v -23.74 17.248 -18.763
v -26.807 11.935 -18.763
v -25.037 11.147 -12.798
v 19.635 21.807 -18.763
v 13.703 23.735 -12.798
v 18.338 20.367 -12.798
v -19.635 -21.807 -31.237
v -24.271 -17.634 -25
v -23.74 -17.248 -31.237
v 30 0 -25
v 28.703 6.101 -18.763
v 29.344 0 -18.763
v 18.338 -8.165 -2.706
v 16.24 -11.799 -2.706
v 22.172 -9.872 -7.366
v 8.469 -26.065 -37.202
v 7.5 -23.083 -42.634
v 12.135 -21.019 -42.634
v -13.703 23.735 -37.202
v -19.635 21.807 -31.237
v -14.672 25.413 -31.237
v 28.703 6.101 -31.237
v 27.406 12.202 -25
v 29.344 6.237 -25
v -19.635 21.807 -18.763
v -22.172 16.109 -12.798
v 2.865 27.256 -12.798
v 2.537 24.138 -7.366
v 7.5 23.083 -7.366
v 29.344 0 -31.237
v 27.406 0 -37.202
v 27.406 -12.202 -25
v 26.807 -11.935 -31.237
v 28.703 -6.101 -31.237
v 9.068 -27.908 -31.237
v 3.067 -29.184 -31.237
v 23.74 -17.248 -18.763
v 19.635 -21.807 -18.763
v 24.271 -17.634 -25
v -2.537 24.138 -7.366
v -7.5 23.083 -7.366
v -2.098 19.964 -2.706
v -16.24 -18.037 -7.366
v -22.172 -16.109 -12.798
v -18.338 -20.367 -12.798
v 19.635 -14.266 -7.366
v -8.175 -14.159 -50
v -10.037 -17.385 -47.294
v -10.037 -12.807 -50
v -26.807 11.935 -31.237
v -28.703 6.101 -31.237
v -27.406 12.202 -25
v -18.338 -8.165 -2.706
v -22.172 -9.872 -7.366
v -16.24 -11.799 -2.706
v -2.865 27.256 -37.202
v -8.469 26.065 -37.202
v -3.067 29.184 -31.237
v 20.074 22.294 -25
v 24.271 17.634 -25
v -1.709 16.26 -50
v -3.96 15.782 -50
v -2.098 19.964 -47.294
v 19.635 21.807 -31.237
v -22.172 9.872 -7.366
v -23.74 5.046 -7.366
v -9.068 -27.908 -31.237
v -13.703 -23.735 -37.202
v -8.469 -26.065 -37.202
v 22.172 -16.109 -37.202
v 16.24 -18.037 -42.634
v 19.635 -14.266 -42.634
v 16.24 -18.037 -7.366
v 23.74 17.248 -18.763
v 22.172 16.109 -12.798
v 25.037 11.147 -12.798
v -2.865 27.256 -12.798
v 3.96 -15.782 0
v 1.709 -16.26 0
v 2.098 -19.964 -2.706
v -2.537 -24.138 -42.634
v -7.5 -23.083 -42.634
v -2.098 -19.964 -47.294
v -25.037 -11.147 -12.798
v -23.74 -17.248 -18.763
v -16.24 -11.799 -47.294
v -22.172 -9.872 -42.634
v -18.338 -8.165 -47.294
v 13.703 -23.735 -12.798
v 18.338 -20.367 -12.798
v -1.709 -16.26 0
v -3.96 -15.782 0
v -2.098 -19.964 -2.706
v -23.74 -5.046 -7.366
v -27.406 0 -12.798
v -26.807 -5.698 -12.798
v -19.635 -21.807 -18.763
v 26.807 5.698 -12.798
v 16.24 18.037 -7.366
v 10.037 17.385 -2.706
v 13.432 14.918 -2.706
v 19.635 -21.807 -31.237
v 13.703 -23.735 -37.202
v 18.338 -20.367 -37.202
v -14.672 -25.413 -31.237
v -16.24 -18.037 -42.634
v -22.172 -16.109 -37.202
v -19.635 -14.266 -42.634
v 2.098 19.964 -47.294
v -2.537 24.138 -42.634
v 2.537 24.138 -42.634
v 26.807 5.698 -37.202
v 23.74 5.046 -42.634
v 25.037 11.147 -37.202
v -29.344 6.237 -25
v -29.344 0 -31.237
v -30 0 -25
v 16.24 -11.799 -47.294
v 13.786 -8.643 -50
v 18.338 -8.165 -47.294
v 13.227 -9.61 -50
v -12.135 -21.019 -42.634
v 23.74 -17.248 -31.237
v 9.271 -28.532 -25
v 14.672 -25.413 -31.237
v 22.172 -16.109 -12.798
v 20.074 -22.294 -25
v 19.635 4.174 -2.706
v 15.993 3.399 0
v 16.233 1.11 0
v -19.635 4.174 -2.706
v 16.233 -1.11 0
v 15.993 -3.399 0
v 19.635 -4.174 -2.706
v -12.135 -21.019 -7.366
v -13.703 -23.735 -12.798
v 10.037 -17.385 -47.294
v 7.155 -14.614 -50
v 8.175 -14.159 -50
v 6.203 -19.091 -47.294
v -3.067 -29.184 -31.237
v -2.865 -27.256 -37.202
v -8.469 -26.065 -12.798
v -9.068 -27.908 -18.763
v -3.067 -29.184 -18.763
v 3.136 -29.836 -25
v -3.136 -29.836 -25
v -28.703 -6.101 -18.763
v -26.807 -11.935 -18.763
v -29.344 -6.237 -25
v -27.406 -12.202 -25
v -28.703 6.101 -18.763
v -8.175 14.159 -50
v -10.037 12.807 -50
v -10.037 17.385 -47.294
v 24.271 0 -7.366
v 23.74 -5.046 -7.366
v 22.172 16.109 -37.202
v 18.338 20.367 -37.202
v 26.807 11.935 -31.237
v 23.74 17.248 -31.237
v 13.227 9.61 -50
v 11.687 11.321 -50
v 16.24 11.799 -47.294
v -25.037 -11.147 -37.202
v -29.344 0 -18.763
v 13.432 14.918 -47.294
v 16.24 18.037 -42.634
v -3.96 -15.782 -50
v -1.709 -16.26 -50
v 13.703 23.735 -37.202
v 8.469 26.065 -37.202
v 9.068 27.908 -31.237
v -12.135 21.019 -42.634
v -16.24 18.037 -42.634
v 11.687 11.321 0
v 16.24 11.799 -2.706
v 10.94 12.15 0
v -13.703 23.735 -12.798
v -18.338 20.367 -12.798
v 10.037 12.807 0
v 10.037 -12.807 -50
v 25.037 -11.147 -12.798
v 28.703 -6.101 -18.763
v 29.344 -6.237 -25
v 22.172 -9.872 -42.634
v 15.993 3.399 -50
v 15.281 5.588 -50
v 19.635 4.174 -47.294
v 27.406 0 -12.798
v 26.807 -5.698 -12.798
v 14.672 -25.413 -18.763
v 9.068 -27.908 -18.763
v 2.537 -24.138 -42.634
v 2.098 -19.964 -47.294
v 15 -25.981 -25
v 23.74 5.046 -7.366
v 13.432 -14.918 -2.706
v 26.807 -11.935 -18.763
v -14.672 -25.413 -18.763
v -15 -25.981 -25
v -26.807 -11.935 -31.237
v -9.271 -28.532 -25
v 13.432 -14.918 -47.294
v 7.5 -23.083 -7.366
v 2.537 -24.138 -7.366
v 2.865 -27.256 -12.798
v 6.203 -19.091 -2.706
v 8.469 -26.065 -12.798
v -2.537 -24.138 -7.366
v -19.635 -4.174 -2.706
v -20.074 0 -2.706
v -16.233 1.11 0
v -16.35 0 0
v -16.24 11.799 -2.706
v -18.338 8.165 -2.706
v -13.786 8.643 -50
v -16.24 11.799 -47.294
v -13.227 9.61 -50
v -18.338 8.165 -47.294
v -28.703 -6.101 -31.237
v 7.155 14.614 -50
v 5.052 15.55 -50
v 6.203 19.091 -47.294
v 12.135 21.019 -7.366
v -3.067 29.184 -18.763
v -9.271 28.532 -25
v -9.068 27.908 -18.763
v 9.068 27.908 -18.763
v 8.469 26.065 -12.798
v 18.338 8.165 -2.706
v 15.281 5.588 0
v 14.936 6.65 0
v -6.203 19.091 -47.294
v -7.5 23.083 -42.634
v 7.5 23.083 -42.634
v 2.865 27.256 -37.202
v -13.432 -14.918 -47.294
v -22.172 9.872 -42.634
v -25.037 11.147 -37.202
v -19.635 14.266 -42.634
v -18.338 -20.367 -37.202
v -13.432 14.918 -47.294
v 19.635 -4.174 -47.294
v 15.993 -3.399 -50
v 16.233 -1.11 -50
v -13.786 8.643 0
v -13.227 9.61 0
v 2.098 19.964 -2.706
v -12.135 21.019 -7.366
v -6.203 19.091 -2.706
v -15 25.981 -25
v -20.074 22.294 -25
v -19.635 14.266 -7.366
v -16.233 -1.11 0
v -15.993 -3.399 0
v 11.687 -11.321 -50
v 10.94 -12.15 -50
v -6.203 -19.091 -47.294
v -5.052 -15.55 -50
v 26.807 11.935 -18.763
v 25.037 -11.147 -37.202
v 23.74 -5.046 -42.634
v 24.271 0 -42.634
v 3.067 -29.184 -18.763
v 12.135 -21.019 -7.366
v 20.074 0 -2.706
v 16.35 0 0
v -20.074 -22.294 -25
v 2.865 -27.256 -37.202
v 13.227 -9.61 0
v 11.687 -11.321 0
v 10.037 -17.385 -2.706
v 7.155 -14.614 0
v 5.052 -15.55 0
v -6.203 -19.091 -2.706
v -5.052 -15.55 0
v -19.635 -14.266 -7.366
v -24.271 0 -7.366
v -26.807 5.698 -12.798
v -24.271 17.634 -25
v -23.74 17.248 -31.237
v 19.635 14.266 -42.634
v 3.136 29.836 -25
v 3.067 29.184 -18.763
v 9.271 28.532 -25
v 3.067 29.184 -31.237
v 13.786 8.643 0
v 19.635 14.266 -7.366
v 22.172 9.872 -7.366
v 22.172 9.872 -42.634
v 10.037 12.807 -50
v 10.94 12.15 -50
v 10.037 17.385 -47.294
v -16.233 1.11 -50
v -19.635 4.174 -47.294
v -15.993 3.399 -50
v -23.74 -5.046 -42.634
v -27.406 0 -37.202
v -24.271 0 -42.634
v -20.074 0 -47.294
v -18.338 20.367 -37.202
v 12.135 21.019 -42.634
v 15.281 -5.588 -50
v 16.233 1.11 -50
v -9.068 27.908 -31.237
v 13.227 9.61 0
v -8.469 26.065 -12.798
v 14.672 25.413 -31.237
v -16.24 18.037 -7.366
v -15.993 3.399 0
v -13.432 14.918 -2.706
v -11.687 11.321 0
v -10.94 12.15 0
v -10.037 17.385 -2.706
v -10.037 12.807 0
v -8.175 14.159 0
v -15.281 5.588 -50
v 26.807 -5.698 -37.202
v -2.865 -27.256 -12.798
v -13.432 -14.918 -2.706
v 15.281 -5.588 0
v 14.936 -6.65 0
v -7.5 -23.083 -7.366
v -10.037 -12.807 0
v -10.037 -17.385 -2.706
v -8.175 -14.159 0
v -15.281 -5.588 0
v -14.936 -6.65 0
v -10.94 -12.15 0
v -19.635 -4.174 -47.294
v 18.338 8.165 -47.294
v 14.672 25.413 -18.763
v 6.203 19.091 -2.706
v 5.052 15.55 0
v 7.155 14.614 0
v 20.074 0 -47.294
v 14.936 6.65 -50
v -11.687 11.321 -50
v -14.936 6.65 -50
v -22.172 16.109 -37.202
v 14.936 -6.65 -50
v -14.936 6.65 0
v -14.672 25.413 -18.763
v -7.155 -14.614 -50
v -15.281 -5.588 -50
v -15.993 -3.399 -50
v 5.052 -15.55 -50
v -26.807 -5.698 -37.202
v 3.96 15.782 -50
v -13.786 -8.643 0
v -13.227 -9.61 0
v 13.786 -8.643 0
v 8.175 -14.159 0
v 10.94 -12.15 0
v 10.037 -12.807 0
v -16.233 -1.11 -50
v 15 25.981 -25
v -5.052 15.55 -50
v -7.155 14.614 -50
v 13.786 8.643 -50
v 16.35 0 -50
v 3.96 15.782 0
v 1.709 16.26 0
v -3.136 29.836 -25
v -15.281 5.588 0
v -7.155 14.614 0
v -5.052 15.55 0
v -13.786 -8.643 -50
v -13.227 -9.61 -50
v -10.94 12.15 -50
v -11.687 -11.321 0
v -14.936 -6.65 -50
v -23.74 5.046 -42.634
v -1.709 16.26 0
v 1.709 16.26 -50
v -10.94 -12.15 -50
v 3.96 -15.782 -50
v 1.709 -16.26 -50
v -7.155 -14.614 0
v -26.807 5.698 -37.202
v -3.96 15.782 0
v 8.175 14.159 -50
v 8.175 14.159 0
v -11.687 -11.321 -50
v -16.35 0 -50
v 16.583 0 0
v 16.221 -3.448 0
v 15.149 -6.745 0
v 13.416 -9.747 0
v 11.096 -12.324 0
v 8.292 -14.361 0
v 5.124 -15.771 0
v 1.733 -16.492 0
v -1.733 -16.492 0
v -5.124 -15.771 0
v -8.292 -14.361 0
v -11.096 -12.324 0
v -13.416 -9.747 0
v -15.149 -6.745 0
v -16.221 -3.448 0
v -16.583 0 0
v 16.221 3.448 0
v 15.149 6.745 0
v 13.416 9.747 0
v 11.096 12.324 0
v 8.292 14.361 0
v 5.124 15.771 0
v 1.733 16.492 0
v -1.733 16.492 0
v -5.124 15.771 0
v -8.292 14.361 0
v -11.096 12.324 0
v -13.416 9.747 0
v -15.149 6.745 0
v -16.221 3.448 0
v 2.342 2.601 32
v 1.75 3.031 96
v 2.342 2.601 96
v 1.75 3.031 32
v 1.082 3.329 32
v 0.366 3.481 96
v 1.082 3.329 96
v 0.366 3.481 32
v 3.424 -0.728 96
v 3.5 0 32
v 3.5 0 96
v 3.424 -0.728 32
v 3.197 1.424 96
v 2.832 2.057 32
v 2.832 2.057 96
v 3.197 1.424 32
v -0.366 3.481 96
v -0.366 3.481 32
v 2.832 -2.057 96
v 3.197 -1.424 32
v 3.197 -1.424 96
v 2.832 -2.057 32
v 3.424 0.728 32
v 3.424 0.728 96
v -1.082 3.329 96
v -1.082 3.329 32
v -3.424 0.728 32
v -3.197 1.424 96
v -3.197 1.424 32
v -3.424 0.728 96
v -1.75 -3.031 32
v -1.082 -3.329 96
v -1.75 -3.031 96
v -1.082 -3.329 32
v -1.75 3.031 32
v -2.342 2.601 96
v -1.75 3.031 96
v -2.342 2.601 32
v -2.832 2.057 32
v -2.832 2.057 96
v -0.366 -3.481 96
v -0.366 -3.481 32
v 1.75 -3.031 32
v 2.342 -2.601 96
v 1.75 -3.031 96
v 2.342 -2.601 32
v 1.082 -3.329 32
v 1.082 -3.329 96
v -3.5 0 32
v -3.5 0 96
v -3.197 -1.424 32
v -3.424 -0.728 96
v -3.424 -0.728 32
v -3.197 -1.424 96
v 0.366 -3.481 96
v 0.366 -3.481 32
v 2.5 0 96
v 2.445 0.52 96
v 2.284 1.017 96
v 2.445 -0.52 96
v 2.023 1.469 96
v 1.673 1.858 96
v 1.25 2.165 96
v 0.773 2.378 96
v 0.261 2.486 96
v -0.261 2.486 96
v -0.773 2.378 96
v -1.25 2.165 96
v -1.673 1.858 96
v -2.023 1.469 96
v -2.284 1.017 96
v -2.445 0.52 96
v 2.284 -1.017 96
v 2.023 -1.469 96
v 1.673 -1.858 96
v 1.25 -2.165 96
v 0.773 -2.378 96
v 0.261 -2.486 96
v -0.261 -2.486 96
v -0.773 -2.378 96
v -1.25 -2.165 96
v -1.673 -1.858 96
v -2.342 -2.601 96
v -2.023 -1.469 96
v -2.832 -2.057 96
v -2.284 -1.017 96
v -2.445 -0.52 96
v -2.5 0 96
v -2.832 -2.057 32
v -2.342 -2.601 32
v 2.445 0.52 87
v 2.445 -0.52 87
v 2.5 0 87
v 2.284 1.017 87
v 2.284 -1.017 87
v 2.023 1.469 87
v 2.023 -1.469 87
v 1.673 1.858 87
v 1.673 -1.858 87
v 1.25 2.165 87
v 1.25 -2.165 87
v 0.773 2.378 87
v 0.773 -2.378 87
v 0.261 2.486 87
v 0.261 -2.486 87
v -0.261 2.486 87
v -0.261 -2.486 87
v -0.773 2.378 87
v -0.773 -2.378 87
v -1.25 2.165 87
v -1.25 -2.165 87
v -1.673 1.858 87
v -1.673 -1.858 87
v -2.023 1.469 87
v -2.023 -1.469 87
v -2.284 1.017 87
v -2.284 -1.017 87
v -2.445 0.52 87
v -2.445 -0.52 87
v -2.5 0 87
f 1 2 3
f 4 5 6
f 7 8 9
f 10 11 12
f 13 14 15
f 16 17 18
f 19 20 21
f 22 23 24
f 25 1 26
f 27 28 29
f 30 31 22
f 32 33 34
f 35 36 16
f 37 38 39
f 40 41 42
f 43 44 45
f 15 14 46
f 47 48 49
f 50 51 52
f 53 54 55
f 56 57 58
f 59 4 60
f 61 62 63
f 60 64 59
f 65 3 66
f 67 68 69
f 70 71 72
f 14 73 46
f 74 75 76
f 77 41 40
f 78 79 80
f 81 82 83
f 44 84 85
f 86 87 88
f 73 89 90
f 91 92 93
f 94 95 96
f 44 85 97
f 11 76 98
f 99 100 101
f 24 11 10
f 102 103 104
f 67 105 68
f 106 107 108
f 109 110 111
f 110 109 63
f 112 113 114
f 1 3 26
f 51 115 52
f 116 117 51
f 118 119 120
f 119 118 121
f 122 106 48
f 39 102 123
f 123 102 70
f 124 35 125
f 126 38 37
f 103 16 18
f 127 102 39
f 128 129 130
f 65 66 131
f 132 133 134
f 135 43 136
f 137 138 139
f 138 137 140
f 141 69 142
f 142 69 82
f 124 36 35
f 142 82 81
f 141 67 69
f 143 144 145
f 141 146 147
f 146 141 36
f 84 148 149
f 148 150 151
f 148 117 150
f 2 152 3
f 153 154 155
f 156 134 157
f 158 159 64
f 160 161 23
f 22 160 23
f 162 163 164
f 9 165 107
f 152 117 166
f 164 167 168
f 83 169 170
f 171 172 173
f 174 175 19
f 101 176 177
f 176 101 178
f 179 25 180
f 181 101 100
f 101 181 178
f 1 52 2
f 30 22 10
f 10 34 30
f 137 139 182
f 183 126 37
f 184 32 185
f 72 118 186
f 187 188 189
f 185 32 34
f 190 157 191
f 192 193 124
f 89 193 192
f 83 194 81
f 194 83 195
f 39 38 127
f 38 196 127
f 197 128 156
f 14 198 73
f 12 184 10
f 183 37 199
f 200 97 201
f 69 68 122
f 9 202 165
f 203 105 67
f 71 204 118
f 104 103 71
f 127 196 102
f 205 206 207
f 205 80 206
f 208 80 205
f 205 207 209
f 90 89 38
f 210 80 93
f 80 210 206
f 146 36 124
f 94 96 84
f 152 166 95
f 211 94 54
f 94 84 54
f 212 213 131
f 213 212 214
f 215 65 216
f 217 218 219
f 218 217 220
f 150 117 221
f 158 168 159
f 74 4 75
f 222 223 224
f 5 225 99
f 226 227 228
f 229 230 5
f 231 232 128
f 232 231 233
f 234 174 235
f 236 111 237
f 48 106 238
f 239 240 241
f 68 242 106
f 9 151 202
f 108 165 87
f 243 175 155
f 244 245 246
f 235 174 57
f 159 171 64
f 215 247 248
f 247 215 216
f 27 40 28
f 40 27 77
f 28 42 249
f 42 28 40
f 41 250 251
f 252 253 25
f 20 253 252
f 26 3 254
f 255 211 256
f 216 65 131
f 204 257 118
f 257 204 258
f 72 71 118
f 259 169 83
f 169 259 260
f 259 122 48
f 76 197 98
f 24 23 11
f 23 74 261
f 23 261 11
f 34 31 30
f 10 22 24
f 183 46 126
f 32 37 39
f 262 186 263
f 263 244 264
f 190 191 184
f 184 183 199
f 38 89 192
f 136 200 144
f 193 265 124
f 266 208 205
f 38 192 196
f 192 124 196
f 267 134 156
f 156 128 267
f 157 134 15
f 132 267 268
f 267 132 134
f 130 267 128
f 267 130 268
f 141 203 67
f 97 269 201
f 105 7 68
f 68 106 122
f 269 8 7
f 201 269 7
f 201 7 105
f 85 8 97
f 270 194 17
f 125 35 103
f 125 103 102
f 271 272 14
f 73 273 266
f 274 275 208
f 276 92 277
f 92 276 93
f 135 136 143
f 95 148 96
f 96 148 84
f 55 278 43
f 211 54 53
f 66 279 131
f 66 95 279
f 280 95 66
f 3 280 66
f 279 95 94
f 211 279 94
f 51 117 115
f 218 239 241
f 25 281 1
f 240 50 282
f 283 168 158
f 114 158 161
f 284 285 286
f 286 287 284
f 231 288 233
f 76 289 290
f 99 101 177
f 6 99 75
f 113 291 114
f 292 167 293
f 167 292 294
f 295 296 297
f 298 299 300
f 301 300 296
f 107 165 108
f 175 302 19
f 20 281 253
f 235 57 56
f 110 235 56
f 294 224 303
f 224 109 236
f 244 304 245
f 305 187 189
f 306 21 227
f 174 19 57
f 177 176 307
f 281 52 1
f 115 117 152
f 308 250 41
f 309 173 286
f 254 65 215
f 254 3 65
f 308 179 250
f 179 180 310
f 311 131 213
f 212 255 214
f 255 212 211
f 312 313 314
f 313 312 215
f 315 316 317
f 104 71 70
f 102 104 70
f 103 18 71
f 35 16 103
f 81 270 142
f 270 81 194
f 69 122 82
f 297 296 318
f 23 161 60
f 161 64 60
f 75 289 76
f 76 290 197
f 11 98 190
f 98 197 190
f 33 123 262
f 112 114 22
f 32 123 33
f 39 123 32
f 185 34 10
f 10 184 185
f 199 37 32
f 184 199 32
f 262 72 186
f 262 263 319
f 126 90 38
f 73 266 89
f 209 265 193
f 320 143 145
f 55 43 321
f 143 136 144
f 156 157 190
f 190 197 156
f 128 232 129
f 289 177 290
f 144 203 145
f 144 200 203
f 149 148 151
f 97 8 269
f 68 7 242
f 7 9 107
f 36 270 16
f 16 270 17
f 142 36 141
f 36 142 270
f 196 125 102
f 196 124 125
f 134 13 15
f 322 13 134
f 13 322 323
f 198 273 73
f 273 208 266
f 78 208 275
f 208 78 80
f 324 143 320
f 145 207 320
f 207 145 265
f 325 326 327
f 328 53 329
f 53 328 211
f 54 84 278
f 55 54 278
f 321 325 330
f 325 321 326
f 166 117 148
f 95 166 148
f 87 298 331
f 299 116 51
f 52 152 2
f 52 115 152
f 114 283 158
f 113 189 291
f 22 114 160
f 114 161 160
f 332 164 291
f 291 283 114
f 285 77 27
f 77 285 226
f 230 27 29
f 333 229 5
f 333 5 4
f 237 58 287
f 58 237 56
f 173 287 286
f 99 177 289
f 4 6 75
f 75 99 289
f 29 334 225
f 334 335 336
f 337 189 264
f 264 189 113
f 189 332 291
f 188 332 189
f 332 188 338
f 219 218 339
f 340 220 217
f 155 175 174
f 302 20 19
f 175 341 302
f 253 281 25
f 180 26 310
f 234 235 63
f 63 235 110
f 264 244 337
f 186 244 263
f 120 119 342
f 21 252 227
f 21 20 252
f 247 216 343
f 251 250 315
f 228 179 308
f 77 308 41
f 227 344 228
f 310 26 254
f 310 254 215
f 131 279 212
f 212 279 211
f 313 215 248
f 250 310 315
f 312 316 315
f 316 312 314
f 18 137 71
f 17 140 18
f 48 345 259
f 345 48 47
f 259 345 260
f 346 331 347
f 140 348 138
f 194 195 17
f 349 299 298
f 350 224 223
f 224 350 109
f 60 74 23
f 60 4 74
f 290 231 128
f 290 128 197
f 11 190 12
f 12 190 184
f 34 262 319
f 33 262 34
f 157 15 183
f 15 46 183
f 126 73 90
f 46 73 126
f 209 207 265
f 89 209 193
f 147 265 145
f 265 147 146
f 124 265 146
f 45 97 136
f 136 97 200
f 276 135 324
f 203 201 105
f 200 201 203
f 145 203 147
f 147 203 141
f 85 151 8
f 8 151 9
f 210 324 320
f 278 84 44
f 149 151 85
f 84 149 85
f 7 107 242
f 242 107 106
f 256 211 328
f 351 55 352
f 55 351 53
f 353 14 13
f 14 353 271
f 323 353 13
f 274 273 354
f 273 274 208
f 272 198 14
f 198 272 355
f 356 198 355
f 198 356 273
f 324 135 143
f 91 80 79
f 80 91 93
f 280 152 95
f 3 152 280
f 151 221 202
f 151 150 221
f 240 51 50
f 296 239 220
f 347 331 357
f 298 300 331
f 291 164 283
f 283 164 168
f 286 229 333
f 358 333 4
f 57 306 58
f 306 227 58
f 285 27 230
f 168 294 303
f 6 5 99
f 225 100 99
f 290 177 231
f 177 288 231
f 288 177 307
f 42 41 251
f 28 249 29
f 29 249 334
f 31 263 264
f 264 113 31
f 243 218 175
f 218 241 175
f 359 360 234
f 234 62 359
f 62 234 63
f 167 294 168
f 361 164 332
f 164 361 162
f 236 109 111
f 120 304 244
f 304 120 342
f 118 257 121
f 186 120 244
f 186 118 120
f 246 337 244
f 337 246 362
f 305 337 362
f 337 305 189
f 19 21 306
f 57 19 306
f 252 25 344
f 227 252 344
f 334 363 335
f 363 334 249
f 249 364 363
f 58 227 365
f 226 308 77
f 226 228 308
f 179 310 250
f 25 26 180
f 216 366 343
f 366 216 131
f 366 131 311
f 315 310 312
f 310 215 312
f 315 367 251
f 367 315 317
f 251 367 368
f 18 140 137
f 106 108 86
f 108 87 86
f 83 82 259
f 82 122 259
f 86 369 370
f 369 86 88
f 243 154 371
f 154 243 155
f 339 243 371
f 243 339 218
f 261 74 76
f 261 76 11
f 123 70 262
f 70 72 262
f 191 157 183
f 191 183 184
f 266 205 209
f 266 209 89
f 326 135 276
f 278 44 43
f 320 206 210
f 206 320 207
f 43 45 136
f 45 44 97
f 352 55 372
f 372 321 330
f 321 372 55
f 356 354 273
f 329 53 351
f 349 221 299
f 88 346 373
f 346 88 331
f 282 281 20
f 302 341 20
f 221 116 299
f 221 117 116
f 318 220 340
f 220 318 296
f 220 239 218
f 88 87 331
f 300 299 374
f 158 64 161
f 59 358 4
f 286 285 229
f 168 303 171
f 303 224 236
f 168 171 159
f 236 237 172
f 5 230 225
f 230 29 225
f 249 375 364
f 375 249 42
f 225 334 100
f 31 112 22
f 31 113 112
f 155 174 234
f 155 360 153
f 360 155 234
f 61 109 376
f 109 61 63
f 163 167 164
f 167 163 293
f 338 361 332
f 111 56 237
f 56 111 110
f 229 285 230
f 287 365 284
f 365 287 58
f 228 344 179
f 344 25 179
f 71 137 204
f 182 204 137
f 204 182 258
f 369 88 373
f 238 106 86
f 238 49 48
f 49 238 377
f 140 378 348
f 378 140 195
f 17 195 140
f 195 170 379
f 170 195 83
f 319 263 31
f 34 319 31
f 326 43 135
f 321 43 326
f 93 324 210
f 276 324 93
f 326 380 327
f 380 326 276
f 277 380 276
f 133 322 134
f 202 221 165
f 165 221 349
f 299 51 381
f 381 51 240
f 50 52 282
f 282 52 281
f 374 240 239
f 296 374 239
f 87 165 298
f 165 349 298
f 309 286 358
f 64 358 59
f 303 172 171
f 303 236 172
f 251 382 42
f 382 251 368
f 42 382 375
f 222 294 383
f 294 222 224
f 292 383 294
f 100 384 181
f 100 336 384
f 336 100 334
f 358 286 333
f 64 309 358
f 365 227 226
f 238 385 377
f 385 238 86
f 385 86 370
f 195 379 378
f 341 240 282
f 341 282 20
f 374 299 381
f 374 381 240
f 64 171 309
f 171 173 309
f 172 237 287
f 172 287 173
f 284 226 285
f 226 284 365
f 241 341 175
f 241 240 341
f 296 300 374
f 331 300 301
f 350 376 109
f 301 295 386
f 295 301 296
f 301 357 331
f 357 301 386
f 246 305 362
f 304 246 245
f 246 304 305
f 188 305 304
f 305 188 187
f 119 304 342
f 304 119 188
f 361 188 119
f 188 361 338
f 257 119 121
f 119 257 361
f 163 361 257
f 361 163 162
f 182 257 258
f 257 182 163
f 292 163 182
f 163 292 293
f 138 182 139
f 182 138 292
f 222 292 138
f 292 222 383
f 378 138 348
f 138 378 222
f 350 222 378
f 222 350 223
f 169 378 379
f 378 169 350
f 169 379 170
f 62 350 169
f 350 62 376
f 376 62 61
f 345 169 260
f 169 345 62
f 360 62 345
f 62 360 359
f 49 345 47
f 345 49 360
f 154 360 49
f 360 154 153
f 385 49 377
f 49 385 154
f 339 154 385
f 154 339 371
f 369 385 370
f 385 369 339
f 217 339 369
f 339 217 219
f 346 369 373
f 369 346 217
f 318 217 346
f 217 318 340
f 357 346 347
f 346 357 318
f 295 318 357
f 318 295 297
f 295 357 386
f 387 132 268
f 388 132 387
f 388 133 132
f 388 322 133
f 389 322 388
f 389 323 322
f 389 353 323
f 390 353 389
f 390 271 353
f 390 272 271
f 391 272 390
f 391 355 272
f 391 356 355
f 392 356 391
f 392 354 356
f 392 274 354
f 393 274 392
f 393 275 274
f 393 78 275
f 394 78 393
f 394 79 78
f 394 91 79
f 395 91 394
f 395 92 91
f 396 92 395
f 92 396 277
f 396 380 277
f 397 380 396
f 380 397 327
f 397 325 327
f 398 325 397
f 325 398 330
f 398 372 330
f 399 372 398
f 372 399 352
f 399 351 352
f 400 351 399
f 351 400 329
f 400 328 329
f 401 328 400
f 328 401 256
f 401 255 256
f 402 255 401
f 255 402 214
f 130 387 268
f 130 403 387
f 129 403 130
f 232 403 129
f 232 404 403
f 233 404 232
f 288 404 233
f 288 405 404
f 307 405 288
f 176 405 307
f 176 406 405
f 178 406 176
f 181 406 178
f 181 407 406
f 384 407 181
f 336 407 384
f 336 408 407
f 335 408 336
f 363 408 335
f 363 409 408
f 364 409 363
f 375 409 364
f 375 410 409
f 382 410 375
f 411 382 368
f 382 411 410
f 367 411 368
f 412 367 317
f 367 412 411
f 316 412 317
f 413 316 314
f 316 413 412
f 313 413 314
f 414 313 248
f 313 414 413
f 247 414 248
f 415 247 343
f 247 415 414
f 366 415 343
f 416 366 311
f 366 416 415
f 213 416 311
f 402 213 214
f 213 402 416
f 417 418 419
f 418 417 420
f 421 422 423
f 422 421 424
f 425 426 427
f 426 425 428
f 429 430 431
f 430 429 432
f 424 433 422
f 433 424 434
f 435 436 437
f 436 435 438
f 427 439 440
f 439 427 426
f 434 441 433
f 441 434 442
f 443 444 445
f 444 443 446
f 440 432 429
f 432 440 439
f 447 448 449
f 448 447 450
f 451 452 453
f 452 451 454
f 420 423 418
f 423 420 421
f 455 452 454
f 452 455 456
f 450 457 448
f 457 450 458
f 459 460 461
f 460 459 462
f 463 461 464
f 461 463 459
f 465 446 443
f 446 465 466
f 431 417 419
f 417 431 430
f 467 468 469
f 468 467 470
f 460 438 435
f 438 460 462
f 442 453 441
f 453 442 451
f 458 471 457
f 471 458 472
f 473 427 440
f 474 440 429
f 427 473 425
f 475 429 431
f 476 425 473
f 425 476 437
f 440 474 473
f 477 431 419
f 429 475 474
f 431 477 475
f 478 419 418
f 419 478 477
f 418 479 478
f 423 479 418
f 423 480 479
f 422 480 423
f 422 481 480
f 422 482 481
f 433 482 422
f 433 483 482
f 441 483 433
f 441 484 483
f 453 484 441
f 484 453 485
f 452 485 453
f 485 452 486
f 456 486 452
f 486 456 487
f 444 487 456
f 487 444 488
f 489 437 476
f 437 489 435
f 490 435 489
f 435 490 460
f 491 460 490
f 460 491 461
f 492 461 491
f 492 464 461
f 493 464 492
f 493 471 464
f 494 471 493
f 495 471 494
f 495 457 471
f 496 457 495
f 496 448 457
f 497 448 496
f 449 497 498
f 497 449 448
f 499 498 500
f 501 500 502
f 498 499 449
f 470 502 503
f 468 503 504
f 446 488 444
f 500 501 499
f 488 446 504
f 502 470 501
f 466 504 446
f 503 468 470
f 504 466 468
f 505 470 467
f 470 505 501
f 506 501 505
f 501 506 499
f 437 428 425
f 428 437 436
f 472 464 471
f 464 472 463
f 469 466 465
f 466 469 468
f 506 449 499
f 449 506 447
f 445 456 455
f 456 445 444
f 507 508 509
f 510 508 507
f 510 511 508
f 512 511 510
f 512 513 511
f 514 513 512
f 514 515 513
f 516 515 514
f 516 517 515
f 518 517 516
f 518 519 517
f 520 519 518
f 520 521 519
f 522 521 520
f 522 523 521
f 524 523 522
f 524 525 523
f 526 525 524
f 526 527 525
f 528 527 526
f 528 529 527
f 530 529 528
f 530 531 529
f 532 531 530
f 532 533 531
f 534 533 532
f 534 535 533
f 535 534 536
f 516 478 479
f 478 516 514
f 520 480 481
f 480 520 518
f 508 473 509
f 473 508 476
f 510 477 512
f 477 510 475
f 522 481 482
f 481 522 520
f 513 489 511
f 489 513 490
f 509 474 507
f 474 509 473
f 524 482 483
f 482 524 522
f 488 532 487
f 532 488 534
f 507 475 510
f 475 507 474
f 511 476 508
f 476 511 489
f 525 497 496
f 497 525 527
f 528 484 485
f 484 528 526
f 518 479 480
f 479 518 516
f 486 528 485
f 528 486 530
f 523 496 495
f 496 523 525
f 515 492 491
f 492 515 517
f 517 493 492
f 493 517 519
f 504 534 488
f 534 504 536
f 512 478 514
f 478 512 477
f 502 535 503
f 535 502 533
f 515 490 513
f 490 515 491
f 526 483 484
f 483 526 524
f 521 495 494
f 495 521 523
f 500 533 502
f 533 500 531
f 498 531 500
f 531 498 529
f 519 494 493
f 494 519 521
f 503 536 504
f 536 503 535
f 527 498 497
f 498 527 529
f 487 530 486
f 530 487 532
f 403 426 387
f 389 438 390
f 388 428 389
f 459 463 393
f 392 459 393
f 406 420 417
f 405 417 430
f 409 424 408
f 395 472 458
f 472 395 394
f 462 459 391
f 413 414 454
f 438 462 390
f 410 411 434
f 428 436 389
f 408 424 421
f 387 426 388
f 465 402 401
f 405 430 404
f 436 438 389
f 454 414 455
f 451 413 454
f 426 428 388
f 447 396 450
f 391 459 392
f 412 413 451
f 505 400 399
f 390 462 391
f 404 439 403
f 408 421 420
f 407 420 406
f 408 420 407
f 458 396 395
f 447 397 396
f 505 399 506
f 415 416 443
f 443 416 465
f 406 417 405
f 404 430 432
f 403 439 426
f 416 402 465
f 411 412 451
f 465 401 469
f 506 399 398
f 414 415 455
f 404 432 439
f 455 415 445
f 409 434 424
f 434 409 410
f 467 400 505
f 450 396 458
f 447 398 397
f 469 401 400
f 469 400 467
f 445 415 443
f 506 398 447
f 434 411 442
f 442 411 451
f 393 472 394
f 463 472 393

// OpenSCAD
// Ball Diameter
ball_d = 60;  // [20:90]
// Stylus Length
stylus = 96;  // [20:230]
// Surface Smoothing
smooth = 30;  // [30:100]

$fn = smooth;
ball = ball_d/2;
union()
{
cylinder (h=stylus/3, r1=ball*sin(acos((ball-5)/ball)), r2=3.5);
difference()
{
translate([0,0,-ball+5])
sphere(ball);
translate([-ball, -ball, -ball*4+10])
cube(ball*2);
}
difference()
{
cylinder (h=stylus, r1=3.5, r2=3.5);
translate([0,0,stylus-9])
cylinder (h=9, r1=2.5, r2=2.5);
}
}
